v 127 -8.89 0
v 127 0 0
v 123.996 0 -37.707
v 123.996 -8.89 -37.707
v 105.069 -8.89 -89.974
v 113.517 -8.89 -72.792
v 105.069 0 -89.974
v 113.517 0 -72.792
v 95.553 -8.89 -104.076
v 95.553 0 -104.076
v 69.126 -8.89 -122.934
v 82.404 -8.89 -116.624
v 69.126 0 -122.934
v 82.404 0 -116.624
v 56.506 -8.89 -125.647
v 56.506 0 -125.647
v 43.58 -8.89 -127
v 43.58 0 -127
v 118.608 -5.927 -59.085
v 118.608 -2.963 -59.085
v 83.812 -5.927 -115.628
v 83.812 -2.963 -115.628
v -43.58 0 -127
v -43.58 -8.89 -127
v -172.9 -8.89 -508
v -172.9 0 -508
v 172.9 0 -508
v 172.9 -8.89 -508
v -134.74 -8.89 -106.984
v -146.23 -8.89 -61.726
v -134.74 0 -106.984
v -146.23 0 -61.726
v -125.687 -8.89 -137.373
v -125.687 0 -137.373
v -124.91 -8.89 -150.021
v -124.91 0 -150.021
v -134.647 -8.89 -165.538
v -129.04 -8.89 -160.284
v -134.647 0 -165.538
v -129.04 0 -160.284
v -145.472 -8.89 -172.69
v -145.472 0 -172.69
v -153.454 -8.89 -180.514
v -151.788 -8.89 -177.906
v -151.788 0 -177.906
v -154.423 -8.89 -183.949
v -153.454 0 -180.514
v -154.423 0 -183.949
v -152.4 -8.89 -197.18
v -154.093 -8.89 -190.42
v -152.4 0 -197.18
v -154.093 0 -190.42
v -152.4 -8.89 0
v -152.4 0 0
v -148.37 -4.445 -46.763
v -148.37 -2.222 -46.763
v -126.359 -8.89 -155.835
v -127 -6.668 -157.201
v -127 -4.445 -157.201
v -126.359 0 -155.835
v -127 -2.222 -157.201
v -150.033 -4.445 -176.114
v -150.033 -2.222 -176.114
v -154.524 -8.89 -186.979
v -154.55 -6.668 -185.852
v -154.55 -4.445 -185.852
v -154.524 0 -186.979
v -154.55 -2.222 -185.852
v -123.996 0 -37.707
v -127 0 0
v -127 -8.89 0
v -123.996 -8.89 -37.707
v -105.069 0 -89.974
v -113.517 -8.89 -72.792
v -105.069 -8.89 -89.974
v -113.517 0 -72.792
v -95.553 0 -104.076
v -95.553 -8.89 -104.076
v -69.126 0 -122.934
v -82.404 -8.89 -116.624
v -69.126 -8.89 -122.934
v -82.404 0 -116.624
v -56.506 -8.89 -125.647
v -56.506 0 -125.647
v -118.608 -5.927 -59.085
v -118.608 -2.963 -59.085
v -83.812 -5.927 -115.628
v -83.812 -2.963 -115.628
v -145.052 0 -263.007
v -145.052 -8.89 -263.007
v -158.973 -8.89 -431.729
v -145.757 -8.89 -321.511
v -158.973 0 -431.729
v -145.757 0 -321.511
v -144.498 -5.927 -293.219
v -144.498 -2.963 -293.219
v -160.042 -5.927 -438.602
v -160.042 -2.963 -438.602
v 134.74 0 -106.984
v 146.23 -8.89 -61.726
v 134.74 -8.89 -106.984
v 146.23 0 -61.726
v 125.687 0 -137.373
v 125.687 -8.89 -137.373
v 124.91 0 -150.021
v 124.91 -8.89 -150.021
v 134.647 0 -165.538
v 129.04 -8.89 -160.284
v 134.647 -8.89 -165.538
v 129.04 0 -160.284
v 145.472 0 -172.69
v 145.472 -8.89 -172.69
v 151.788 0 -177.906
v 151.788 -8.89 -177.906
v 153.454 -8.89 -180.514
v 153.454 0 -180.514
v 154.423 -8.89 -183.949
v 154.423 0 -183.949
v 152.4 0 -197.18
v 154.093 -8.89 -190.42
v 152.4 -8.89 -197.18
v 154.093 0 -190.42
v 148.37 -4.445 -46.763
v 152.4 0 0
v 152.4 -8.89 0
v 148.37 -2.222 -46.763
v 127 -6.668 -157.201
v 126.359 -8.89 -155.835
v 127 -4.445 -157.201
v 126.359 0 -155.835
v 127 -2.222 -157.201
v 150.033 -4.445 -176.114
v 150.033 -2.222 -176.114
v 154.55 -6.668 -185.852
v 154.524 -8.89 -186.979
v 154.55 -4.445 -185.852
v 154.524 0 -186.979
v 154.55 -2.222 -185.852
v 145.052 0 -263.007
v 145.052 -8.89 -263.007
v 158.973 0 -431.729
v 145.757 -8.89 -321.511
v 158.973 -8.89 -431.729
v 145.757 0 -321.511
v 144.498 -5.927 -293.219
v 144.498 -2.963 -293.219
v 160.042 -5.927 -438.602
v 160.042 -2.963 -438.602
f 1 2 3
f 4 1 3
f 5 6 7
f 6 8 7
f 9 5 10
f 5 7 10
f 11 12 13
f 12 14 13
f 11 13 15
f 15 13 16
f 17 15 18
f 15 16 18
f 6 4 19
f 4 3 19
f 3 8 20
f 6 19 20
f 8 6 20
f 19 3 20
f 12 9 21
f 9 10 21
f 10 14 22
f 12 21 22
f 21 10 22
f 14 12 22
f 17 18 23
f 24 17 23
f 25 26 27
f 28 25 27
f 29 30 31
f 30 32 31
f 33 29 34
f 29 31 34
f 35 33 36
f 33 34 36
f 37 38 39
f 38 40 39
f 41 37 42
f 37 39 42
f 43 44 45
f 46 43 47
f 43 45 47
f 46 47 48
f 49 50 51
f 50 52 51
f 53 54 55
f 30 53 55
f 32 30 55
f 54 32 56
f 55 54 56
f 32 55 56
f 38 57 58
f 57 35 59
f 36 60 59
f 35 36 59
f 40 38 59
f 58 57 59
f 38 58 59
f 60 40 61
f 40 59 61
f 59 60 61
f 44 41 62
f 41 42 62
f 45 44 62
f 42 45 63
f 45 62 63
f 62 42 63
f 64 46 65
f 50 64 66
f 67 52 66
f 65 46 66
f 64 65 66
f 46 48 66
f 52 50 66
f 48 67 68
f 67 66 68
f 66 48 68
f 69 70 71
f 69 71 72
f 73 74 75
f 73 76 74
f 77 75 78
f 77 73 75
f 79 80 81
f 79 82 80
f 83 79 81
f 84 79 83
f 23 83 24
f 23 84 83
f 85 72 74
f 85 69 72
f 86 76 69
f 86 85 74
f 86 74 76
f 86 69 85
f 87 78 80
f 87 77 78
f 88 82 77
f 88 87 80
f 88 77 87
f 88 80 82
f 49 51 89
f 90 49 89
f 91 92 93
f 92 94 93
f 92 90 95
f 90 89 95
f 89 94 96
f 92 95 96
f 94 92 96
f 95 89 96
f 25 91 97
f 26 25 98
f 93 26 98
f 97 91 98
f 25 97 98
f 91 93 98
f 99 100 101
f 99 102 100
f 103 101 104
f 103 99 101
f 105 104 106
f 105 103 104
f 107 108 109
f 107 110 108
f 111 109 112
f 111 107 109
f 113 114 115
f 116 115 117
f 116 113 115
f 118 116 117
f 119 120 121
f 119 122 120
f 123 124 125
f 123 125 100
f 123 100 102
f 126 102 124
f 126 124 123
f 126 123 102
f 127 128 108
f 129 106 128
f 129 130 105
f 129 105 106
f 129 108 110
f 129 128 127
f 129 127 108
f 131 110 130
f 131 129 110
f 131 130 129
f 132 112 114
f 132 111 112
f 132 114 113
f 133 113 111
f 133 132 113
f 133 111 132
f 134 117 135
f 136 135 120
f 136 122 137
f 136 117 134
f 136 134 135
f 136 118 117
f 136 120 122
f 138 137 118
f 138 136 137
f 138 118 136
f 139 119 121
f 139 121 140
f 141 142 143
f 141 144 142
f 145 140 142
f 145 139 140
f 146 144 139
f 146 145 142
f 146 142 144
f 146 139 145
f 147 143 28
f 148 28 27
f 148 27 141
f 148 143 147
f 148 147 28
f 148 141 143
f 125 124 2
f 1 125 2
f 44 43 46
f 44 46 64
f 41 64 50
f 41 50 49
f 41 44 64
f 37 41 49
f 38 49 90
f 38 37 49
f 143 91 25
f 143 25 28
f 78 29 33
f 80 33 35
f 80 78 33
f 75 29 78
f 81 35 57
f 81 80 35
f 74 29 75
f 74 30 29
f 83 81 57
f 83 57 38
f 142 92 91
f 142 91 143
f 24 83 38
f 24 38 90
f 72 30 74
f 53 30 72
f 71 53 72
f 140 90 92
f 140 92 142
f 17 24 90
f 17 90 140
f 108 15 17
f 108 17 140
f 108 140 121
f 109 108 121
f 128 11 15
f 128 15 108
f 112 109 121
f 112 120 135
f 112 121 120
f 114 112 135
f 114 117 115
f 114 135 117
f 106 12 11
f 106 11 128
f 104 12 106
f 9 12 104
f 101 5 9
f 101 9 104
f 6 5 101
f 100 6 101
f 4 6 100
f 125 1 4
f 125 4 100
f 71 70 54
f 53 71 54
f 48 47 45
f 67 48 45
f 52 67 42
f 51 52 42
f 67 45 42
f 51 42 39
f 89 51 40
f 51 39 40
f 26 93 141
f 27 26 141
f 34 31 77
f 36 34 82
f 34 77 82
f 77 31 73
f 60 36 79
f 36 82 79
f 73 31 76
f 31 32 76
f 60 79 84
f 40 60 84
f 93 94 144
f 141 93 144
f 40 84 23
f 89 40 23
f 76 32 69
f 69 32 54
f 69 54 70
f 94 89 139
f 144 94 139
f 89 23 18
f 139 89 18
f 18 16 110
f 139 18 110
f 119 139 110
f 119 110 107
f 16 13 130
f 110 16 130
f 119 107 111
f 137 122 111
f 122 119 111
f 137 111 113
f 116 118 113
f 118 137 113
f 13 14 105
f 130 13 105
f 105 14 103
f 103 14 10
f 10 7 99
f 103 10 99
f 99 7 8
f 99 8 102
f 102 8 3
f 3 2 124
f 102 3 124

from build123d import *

# Parameters (mm, degrees)
F1_DEPTH = 8.89


with BuildPart() as f1:
    # F0 (on Front) → F1 (new body)
    with BuildSketch(Plane.XZ):
        with BuildLine():
            Line((152.4, 0), (127, 0))
            add(Edge.make_bspline(
                [(127, 0), (127, -20.0168341398), (123.3922770096, -58.2410161724), (89.3160713506, -123.1038827606), (57.5735042432, -125.7764468865), (43.5800775886, -127)],
                knots=[0, 0, 0, 0, 0.345812323, 0.7105558481, 1, 1, 1, 1], degree=3))
            Line((43.5800775886, -127), (0, -127))
            Line((0, -127), (-43.5800775886, -127))
            add(Edge.make_bspline(
                [(-127, 0), (-127, -20.0168341398), (-123.3922770096, -58.2410161724), (-89.3160713506, -123.1038827606), (-57.5735042432, -125.7764468865), (-43.5800775886, -127)],
                knots=[0, 0, 0, 0, 0.345812323, 0.7105558481, 1, 1, 1, 1], degree=3))
            Line((-127, 0), (-152.4, 0))
            add(Edge.make_bspline(
                [(-152.4, 0), (-150.2703878505, -31.3639571024), (-146.3939702155, -88.3715453558), (-110.9714635835, -160.9462971944), (-158.6767490389, -174.9726116512), (-154.2449504284, -190.6305366091), (-152.4, -197.1800625324)],
                knots=[0, 0, 0, 0, 0.3476574396, 0.6384459753, 0.8455987873, 1, 1, 1, 1], degree=3))
            add(Edge.make_bspline(
                [(-152.4, -197.1800625324), (-148.2010351465, -226.5358633988), (-138.5263708492, -292.0003756963), (-159.3646682678, -437.8166234112), (-168.1102758726, -487.6635444085), (-172.8998571634, -508)],
                knots=[0, 0, 0, 0, 0.3238760373, 0.7228207872, 1, 1, 1, 1], degree=3))
            Line((-172.8998571634, -508), (0, -508))
            Line((0, -508), (172.8998571634, -508))
            add(Edge.make_bspline(
                [(152.4, -197.1800625324), (148.2010351465, -226.5358633988), (138.5263708492, -292.0003756963), (159.3646682678, -437.8166234112), (168.1102758726, -487.6635444085), (172.8998571634, -508)],
                knots=[0, 0, 0, 0, 0.3238760373, 0.7228207872, 1, 1, 1, 1], degree=3))
            add(Edge.make_bspline(
                [(152.4, 0), (150.2703878505, -31.3639571024), (146.3939702155, -88.3715453558), (110.9714635835, -160.9462971944), (158.6767490389, -174.9726116512), (154.2449504284, -190.6305366091), (152.4, -197.1800625324)],
                knots=[0, 0, 0, 0, 0.3476574396, 0.6384459753, 0.8455987873, 1, 1, 1, 1], degree=3))
        make_face()
    extrude(amount=F1_DEPTH)


solid = f1.part
